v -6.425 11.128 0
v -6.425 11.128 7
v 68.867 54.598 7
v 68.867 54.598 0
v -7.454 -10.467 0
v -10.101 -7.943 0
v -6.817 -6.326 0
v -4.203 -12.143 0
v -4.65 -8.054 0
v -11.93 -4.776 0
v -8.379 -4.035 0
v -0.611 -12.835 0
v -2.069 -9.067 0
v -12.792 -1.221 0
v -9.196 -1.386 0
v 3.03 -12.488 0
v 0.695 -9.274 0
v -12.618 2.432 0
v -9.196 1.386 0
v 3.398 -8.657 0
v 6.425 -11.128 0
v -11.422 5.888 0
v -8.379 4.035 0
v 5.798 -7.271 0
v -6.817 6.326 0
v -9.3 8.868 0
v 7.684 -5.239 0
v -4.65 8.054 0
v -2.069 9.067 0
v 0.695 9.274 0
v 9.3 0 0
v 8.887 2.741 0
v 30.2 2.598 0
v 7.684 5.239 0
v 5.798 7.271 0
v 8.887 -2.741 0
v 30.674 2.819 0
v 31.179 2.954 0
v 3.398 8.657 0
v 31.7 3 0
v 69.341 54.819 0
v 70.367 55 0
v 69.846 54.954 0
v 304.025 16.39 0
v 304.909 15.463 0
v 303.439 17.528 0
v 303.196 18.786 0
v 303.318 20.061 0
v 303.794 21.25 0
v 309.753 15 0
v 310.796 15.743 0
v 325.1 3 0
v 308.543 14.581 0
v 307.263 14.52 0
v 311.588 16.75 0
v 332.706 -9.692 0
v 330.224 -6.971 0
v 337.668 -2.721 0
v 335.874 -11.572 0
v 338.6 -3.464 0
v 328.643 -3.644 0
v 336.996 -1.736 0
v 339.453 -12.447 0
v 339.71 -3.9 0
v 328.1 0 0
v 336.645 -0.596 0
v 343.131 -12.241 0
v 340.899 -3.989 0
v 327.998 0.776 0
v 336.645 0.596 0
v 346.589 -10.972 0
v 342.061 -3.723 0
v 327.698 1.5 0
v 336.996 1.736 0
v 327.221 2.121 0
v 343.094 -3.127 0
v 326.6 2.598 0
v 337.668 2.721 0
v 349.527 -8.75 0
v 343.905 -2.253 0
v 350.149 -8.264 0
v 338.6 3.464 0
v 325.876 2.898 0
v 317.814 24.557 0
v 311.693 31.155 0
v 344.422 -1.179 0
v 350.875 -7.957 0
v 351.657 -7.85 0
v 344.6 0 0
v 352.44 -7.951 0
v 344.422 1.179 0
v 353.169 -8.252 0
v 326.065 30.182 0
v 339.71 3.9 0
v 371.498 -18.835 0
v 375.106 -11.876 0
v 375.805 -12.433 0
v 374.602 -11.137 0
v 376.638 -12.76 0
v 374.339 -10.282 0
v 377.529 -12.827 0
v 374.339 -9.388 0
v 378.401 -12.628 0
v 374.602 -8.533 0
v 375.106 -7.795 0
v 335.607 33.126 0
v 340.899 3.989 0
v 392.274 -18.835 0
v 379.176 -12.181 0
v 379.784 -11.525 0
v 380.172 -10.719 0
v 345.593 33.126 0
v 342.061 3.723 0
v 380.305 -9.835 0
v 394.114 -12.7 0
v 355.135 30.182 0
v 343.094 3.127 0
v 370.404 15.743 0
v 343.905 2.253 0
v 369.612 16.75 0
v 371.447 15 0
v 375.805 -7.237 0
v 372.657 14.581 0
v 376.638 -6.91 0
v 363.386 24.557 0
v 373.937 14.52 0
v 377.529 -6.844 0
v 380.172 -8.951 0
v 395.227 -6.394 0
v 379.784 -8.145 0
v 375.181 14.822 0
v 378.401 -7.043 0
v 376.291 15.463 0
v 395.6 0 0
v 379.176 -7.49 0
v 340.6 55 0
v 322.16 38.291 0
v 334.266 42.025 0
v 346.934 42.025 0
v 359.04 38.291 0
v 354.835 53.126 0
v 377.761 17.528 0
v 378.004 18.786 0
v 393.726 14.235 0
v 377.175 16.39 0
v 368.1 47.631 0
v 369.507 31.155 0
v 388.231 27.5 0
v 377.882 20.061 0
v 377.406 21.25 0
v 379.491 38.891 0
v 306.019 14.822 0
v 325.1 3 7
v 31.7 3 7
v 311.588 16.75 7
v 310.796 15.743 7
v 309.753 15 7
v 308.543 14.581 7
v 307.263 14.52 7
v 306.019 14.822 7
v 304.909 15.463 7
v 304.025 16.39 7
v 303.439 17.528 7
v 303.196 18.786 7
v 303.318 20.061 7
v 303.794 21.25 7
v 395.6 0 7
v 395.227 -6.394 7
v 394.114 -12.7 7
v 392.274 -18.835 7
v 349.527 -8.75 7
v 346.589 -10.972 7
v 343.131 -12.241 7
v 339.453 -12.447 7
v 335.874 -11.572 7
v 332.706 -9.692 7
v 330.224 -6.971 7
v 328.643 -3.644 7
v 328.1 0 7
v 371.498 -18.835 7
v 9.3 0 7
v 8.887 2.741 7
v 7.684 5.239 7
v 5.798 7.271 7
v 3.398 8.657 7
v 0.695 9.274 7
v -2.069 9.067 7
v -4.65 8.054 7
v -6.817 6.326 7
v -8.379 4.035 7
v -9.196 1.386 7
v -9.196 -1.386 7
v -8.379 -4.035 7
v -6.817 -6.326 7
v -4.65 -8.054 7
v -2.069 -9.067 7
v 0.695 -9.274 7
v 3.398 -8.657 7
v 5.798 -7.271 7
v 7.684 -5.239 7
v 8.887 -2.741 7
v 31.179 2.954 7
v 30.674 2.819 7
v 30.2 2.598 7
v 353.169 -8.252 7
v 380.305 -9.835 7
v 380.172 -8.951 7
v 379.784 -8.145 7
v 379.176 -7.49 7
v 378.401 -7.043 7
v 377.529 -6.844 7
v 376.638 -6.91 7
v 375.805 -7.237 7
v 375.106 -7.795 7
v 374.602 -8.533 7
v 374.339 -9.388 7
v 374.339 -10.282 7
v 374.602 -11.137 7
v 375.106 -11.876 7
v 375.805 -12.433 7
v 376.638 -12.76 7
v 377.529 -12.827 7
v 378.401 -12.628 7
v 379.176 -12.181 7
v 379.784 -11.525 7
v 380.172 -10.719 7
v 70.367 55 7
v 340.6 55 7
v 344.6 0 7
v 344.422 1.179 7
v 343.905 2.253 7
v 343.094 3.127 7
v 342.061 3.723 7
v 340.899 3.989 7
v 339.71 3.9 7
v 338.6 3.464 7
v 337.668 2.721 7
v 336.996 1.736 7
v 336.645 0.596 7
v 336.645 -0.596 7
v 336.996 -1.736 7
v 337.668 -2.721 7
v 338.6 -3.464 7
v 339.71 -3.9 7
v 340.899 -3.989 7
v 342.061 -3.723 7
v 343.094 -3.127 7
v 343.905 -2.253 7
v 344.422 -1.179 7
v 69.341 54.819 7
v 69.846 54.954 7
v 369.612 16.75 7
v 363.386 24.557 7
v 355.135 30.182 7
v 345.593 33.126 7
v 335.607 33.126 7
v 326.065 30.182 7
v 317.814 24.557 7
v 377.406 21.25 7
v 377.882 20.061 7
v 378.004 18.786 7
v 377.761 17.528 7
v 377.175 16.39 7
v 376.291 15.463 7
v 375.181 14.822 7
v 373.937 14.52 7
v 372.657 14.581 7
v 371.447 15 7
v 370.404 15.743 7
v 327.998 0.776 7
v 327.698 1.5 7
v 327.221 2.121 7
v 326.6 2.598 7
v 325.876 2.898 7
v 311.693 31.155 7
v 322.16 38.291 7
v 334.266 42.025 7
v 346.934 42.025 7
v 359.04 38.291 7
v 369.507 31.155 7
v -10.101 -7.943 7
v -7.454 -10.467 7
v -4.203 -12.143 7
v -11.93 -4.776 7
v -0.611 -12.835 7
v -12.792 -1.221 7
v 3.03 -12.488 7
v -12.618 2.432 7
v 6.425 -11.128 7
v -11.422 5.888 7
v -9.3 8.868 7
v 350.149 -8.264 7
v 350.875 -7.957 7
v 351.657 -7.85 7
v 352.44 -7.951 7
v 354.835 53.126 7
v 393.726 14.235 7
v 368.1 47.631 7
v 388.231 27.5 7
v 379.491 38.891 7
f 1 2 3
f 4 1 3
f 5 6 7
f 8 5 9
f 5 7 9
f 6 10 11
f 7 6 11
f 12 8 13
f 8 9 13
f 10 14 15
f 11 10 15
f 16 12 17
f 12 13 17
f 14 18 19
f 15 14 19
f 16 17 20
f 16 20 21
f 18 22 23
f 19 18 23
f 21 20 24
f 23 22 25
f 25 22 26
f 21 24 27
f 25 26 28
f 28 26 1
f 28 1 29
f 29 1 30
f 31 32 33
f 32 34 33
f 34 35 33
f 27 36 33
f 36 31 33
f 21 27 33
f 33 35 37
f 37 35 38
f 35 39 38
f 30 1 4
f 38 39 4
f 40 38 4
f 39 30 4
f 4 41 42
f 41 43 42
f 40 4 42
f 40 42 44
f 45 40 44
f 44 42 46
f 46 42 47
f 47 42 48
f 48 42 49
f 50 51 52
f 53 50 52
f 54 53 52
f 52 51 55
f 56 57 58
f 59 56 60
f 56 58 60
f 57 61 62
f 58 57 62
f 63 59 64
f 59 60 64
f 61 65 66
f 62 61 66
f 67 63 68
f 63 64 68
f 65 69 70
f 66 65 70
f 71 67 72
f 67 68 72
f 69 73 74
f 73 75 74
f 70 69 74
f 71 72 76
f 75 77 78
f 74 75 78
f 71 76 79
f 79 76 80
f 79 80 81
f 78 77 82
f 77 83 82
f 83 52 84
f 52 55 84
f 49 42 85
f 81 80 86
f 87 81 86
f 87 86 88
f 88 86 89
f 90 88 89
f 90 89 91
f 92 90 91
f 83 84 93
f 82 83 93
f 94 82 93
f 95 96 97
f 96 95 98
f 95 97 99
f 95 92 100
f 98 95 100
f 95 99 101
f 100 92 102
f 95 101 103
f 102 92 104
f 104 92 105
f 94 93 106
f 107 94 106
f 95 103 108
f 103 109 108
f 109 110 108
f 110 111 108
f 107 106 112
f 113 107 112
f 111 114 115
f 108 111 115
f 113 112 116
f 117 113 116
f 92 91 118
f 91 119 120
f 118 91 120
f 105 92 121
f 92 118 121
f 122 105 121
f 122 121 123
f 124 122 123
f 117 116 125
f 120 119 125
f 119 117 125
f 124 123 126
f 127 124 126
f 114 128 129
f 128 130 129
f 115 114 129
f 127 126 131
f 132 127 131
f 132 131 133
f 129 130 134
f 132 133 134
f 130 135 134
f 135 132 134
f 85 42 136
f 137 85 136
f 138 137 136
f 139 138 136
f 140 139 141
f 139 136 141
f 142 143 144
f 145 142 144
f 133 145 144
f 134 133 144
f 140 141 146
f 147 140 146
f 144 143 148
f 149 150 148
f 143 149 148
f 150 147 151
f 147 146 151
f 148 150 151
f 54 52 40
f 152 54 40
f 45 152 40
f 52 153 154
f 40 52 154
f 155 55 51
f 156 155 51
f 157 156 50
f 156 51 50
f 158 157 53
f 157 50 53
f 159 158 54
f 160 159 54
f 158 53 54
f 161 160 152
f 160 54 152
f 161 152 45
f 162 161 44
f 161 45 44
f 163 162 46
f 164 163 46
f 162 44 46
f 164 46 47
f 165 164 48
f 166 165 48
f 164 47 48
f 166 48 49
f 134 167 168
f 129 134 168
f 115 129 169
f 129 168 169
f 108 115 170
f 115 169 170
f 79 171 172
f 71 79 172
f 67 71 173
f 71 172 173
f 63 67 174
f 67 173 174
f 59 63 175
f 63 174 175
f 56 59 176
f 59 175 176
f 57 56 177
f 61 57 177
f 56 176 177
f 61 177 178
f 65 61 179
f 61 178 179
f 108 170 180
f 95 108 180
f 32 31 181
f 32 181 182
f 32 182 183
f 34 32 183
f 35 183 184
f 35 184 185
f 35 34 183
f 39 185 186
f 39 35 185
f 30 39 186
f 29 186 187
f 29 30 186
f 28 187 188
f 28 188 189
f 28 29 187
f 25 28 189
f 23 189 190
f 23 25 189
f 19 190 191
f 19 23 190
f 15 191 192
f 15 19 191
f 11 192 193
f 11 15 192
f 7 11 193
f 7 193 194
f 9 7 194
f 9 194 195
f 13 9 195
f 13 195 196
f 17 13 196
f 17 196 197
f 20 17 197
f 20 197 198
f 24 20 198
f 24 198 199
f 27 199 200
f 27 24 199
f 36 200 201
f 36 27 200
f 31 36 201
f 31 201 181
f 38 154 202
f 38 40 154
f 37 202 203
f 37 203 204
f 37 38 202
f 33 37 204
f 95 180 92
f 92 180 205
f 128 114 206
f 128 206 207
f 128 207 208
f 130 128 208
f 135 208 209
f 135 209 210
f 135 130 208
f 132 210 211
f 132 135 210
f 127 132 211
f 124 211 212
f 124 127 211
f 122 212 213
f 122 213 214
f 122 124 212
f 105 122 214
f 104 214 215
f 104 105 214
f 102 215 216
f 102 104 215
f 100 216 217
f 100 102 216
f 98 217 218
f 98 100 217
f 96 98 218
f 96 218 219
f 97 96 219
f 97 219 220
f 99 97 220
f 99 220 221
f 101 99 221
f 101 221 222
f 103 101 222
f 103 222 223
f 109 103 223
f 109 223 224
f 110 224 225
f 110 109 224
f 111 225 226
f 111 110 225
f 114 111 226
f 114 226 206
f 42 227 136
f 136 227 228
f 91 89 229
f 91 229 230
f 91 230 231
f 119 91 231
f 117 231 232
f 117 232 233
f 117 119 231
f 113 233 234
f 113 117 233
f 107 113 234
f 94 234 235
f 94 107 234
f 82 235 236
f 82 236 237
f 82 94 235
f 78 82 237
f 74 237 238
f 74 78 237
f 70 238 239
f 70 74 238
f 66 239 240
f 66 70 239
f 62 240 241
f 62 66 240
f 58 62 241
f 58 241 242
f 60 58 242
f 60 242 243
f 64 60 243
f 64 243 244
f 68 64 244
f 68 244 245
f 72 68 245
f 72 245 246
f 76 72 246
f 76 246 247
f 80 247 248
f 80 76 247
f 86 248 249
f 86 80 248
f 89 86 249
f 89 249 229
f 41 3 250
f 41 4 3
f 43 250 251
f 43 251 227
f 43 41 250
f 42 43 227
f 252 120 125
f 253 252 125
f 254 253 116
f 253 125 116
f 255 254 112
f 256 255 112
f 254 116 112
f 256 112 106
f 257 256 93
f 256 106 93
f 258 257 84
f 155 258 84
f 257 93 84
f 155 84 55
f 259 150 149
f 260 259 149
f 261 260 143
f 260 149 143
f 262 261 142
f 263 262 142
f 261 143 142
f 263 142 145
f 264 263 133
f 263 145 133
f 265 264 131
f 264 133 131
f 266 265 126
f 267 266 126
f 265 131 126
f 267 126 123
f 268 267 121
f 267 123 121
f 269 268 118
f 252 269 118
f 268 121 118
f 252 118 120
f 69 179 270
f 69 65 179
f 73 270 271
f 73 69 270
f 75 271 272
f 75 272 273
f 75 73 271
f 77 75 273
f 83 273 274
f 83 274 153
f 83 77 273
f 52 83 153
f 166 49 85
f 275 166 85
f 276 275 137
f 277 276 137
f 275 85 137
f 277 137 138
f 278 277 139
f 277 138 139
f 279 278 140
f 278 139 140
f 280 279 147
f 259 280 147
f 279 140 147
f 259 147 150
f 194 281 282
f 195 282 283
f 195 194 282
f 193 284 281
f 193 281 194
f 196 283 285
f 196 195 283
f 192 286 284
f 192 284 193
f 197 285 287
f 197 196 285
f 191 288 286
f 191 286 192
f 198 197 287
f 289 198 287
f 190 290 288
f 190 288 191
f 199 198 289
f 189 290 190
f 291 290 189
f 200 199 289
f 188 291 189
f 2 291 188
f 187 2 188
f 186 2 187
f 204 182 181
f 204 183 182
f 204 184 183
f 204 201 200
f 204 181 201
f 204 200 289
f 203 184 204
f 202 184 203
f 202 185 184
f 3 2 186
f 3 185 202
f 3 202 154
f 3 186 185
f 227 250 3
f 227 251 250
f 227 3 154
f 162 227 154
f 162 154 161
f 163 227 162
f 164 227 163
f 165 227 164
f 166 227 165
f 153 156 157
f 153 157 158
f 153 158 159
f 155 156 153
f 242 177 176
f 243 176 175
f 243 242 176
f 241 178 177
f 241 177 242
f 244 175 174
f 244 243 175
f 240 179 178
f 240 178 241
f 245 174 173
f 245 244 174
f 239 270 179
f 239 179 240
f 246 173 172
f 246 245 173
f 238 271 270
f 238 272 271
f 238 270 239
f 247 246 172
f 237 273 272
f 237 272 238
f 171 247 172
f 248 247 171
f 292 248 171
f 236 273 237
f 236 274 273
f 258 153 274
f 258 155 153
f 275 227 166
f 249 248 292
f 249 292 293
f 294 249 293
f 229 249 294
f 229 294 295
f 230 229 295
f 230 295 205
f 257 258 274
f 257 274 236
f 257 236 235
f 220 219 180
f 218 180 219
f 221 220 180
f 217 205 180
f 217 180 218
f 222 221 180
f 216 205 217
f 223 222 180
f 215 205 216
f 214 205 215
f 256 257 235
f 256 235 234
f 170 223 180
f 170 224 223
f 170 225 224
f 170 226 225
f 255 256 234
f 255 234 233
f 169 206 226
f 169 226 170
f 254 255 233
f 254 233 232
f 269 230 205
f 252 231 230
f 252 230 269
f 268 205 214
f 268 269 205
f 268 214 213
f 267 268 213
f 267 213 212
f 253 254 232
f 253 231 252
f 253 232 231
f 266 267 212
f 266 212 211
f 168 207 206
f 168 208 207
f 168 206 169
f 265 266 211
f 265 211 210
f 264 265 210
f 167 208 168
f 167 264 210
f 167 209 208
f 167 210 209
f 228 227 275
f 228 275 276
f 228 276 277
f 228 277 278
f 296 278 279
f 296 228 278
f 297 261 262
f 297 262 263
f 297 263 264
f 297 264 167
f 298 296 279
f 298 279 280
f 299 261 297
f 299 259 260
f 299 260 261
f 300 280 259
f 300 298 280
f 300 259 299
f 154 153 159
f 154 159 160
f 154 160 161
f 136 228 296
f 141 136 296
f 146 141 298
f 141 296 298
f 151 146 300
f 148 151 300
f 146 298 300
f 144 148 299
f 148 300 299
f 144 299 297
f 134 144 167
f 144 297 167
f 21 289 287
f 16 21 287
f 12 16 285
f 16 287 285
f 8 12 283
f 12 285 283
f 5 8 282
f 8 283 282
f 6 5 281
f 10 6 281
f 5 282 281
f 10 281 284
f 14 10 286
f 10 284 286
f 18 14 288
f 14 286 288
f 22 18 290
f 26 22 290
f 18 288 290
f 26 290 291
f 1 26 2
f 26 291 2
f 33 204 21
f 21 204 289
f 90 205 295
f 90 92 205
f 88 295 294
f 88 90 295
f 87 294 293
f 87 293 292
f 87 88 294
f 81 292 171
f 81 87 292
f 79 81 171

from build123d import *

# Parameters (mm, degrees)
SKETCH1_W           = 500
SKETCH1_H           = 150
SKETCH1_R           = 9.3
SKETCH1_R_2         = 3
SKETCH1_R_3         = 4
BOSS_EXTRUDE1_DEPTH = 7
CUT_EXTRUDE1_DEPTH  = 7
FILLET2_R           = 3


with BuildPart() as part:
    # Sketch1 → Boss-Extrude1 (new body)
    with BuildSketch(Plane.XY):
        with Locations((200, 0)):
            Rectangle(SKETCH1_W, SKETCH1_H)
        Circle(SKETCH1_R, mode=Mode.SUBTRACT)
        with BuildLine():
            ThreePointArc((303.793920425, 21.250000148), (340.59999997, 42.5), (377.406079545, 21.250000201))
            ThreePointArc((377.406079545, 21.250000201), (375.758965412, 15.102885723), (369.61185099, 16.750000063))
            ThreePointArc((369.61185099, 16.750000063), (340.600001147, 33.5), (311.588150157, 16.750002051))
            ThreePointArc((311.588150157, 16.750002051), (305.441035607, 15.102885134), (303.793920425, 21.250000148))
        make_face(mode=Mode.SUBTRACT)
        with Locations((377.305181399, -9.835123714)):
            Circle(SKETCH1_R_2, mode=Mode.SUBTRACT)
        with Locations((340.6, 0)):
            Circle(SKETCH1_R_3, mode=Mode.SUBTRACT)
    extrude(amount=BOSS_EXTRUDE1_DEPTH)

    # Sketch3 → Cut-Extrude1 (cut)
    with BuildSketch(Plane.XY.offset(7)):
        with BuildLine():
            Line((69.562794416, 55), (-50, 55))
            Line((-50, 55), (-50, -75))
            Line((-50, -75), (450, -75))
            Line((450, -75), (450, 55))
            Line((450, 55), (340.6, 55))
            ThreePointArc((340.6, 55), (379.490872965, 38.890872965), (395.6, 0))
            ThreePointArc((395.6, 0), (394.762205793, -9.563235), (392.274346776, -18.835123714))
            ThreePointArc((392.274346776, -18.835123714), (329.562623749, -53.881131442), (285.681879129, 3))
            Line((285.681879129, 3), (30.896152423, 3))
            Line((30.896152423, 3), (6.425, -11.128426439))
            ThreePointArc((6.425, -11.128426439), (-11.128426439, -6.425), (-6.425, 11.128426439))
            Line((-6.425, 11.128426439), (69.562794416, 55))
        make_face()
        with BuildLine():
            Line((328.4653389, 3), (285.681879129, 3))
            ThreePointArc((285.681879129, 3), (329.562623749, -53.881131442), (392.274346776, -18.835123714))
            Line((392.274346776, -18.835123714), (371.498146439, -18.835123714))
            Line((371.498146439, -18.835123714), (350.968741122, -6.981347115))
            ThreePointArc((350.968741122, -6.981347115), (335.531820751, -11.426441226), (328.4653389, 3))
        make_face()
        Polygon((-50, 75), (-50, 55), (69.562794416, 55), (340.6, 55), (450, 55), (450, 75), align=None)
    extrude(amount=-CUT_EXTRUDE1_DEPTH, mode=Mode.SUBTRACT)

    # Fillet2
    fillet2_edges = [part.edges().sort_by_distance(p)[0] for p in [
        (69.562794416, 55, 3.5),
        (30.896152423, 3, 3.5),
        (328.4653389, 3, 3.5),
        (350.968741122, -6.981347115, 3.5),
    ]]
    fillet(fillet2_edges, radius=FILLET2_R)


solid = part.part
